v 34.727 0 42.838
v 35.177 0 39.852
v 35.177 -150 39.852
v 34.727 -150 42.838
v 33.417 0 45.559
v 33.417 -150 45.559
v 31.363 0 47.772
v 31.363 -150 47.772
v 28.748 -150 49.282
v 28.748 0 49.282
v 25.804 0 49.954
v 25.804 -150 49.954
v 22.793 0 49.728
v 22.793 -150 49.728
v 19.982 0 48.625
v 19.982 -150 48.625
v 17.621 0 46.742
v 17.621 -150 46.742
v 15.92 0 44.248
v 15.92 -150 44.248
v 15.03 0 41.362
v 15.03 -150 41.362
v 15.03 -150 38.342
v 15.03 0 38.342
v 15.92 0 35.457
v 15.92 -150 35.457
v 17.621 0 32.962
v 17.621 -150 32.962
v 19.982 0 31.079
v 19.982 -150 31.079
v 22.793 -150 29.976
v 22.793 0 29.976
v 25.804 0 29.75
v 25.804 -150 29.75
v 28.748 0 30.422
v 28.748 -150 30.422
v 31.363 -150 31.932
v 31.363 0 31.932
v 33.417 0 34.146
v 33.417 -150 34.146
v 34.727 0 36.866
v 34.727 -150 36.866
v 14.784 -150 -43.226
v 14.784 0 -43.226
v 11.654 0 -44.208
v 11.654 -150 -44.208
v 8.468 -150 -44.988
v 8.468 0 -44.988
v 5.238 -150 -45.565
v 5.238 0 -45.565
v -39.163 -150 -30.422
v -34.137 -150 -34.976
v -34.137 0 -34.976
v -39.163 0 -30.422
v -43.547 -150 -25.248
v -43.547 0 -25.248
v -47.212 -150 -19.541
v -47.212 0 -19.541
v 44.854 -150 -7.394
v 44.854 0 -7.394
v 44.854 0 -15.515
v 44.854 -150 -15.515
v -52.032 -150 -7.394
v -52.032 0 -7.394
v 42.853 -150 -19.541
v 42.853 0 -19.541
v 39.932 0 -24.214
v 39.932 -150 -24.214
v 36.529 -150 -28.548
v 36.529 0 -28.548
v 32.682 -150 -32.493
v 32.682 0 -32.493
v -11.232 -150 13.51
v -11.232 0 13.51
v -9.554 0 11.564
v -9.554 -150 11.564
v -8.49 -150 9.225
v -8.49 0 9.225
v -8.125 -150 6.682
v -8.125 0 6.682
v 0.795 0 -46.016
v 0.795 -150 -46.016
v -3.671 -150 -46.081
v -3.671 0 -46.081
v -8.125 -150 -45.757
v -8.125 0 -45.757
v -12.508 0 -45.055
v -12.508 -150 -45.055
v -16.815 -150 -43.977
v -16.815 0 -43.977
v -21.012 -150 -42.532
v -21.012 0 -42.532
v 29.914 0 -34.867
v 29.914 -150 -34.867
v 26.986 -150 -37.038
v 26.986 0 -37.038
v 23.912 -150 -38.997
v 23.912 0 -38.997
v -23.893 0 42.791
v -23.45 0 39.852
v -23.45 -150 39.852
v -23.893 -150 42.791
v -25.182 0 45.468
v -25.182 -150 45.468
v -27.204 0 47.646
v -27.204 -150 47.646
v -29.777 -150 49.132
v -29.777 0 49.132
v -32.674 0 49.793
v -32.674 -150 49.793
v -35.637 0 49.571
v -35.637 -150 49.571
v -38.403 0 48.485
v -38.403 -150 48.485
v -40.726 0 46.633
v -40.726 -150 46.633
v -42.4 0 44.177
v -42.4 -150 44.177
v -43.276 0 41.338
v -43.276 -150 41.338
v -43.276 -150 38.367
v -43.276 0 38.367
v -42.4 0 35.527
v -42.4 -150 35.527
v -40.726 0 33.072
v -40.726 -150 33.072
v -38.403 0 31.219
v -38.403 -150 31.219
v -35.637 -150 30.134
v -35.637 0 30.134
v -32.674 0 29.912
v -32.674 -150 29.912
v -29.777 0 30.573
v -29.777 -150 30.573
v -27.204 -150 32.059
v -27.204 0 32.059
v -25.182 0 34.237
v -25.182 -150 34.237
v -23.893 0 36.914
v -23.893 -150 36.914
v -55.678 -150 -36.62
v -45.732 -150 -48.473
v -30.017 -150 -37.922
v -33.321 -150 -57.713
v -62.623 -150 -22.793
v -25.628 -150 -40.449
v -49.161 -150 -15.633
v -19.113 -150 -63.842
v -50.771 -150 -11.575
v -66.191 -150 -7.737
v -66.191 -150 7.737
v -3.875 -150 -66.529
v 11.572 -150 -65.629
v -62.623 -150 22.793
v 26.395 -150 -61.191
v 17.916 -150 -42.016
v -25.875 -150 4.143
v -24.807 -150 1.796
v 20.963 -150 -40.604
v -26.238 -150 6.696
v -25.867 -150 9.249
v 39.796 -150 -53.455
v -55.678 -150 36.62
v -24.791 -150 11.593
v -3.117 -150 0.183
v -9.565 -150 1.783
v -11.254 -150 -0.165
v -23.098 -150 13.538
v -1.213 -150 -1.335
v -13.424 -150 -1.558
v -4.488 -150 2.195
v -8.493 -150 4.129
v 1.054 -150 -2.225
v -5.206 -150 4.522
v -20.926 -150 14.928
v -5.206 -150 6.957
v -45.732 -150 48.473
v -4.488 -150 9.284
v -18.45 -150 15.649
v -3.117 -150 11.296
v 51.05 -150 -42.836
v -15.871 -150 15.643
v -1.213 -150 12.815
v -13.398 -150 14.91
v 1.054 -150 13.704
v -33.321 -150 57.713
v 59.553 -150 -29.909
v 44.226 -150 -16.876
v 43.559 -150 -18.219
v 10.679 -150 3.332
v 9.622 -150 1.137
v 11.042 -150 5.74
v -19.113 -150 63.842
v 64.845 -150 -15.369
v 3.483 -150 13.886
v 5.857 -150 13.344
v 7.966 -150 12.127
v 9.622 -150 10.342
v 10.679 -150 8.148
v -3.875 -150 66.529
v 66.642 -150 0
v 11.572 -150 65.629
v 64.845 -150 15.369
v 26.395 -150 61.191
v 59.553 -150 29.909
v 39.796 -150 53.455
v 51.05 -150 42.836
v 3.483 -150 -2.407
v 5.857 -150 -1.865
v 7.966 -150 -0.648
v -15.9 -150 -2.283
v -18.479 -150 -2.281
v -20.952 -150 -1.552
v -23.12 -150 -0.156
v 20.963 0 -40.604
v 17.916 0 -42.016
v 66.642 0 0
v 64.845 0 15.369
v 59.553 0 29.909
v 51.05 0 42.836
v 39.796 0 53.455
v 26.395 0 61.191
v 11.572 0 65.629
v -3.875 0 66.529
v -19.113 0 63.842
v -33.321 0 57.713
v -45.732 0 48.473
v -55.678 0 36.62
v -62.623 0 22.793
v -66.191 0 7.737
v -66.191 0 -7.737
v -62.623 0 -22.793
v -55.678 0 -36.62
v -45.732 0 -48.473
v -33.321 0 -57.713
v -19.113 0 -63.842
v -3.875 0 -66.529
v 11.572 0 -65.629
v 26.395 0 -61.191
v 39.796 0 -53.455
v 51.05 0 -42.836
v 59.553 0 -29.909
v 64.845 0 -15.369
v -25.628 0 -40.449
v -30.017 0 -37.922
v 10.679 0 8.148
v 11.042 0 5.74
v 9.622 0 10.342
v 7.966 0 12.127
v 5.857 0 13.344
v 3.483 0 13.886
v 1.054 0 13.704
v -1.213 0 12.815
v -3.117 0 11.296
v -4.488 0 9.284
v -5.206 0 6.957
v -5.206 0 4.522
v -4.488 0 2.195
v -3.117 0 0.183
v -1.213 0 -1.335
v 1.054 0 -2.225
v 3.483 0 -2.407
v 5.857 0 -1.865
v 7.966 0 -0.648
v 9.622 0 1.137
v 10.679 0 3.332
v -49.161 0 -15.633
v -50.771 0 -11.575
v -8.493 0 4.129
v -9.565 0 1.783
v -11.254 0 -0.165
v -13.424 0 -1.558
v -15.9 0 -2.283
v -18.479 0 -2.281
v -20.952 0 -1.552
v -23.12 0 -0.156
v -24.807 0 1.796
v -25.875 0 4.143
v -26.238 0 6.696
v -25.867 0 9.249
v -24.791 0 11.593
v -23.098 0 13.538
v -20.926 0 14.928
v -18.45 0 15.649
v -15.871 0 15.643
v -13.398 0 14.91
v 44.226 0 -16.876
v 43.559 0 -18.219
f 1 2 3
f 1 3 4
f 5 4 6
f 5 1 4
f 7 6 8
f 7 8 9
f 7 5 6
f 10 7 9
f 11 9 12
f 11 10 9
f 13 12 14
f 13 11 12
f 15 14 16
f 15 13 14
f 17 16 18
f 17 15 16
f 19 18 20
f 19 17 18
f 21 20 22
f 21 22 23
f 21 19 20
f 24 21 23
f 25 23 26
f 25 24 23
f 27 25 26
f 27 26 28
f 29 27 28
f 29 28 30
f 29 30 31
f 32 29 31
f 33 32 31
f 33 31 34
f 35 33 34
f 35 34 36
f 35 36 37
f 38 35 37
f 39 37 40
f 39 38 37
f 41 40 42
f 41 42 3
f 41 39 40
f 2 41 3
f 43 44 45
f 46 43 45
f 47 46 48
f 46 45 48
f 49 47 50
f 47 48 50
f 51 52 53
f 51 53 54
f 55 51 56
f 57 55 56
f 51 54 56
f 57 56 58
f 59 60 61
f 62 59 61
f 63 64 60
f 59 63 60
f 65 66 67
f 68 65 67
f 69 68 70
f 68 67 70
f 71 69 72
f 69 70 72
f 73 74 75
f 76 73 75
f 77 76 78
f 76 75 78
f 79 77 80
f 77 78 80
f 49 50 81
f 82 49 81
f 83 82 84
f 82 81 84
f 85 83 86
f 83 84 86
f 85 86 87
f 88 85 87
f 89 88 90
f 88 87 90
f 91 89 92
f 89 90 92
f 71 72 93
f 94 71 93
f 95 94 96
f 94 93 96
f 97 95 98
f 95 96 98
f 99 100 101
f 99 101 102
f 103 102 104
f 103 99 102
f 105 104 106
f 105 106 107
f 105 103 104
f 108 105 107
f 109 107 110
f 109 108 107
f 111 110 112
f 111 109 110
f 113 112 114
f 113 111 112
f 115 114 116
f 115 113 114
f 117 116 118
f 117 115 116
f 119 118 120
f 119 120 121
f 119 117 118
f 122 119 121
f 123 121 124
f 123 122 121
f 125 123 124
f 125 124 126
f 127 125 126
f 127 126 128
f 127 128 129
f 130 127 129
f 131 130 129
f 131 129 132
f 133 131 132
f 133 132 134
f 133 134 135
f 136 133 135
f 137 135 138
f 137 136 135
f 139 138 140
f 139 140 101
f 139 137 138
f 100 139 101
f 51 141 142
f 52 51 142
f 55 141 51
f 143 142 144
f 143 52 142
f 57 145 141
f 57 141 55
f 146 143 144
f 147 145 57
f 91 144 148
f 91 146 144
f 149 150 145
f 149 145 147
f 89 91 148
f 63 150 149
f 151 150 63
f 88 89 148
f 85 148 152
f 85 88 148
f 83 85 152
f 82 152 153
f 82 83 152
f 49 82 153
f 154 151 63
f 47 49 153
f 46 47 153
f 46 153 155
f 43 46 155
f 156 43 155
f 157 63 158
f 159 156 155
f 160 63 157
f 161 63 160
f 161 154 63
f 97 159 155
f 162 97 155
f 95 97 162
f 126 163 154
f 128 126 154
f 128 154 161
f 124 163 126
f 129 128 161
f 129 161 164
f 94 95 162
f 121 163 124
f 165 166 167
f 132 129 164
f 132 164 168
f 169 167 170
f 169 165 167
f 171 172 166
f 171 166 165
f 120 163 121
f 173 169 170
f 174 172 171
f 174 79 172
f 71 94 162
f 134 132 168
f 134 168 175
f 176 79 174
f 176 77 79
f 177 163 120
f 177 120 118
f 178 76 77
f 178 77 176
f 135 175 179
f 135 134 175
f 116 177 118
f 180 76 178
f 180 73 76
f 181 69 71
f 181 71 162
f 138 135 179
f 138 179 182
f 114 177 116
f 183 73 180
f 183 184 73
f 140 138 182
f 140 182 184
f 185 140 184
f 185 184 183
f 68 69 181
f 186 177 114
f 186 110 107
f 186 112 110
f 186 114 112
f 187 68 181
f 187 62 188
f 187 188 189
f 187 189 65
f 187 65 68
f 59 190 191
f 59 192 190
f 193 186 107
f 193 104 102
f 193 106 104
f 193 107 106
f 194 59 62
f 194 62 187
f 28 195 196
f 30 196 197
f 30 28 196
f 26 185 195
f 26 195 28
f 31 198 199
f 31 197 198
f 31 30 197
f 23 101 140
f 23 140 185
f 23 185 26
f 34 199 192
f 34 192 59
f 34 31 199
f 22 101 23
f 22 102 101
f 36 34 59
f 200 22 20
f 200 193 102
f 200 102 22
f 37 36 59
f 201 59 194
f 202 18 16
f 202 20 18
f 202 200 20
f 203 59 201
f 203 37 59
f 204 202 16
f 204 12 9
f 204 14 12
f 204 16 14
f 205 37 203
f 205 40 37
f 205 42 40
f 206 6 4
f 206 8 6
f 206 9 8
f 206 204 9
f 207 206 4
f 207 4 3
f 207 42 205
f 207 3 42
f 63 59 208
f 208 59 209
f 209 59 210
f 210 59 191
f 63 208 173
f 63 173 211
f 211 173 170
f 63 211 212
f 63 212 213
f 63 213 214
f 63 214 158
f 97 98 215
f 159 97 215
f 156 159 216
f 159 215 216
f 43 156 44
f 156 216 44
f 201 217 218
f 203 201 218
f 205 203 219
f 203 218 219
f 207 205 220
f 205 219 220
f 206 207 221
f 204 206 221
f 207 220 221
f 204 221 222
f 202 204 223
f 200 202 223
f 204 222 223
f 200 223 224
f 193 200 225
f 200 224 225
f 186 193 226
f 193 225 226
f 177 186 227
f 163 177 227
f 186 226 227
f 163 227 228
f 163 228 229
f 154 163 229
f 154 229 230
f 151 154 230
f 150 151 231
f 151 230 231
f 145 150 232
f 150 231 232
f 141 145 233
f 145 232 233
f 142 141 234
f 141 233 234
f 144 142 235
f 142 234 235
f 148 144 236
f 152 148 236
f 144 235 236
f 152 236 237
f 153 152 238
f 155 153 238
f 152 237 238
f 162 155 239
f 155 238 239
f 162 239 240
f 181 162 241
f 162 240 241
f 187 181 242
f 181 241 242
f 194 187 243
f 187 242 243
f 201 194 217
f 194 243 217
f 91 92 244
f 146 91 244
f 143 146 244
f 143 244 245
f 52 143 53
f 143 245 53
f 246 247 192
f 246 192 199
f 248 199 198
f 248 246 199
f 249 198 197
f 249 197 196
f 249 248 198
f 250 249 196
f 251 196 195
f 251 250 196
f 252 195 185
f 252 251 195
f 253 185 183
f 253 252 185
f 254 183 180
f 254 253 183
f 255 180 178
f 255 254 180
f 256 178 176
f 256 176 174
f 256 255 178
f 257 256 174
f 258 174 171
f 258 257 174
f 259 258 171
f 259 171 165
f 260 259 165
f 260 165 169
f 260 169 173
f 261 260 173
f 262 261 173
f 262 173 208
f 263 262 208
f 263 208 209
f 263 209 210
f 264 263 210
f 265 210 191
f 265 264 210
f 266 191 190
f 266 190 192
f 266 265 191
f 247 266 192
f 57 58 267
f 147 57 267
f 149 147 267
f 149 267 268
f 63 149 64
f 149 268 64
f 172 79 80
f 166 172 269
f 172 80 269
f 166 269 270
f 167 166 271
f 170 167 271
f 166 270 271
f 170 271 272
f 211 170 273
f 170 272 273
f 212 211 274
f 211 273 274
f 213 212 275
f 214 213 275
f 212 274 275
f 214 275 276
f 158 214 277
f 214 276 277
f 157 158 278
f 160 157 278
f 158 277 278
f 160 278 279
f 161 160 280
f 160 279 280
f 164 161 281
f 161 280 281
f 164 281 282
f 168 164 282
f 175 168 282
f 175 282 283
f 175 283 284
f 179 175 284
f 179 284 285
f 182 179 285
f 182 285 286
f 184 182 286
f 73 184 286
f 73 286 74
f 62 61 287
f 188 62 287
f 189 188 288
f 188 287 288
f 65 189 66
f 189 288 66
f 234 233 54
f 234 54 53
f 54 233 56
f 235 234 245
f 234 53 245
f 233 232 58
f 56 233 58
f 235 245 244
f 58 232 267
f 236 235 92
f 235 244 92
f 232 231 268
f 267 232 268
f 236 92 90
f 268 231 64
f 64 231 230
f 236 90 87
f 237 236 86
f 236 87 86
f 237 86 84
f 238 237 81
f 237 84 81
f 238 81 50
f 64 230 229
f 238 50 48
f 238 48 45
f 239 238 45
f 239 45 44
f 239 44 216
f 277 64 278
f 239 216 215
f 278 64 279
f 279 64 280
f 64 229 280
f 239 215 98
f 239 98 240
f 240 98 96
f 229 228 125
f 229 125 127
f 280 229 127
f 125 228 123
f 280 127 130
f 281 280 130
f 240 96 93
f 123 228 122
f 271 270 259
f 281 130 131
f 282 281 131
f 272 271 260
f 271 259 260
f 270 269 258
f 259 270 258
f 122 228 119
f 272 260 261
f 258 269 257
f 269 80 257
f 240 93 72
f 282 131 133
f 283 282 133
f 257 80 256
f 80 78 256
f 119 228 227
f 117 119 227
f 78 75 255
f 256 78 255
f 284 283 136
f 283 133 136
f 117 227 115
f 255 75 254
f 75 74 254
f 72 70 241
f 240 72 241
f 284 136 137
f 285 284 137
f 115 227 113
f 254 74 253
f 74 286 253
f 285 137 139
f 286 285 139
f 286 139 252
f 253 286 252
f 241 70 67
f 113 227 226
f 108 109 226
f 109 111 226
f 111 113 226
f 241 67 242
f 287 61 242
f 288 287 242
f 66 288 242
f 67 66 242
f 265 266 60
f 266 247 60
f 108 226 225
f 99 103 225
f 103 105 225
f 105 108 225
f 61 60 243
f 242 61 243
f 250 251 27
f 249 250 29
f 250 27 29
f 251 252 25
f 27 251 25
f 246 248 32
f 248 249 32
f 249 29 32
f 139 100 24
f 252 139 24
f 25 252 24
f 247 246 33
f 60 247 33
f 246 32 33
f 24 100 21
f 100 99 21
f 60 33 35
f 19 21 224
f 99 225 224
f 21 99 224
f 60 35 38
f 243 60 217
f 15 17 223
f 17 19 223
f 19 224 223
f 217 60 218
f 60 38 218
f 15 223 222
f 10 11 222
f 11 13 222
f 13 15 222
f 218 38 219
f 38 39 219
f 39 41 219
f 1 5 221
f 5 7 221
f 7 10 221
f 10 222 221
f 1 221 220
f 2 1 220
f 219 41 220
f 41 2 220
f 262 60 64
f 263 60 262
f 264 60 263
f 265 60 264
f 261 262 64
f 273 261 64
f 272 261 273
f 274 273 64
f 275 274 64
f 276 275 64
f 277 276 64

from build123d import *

# Parameters (mm, degrees)
F0_R     = 66.641501
F0_R_2   = 9.968602
F0_R_3   = 8.169594
F0_R_4   = 10.130103
F1_DEPTH = 150


with BuildPart() as f1:
    # F0 (on Front) → F1 (new body)
    with BuildSketch(Plane.XZ):
        Circle(F0_R)
        with BuildLine():
            ThreePointArc((-47.21239, -19.541254), (-50.009162, -13.621133), (-52.03151, -7.393784))
            Line((-52.03151, -7.393784), (-34.136722, -7.393784))
            Line((-34.136722, -7.393784), (-21.011824, -7.393784))
            Line((-21.011824, -7.393784), (-8.125476, -7.393784))
            Line((-8.125476, -7.393784), (5.238163, -7.393784))
            Line((5.238163, -7.393784), (14.783629, -7.393784))
            Line((14.783629, -7.393784), (23.911529, -7.393784))
            Line((23.911529, -7.393784), (32.681515, -7.393784))
            Line((32.681515, -7.393784), (44.854218, -7.393784))
            Line((44.854218, -7.393784), (44.854218, -15.515085))
            ThreePointArc((44.854218, -15.515085), (43.897568, -17.550039), (42.852925, -19.541254))
            ThreePointArc((42.852925, -19.541254), (38.288746, -26.426826), (32.681515, -32.493274))
            ThreePointArc((32.681515, -32.493274), (28.469498, -35.978188), (23.911529, -38.996572))
            ThreePointArc((23.911529, -38.996572), (19.451177, -41.334676), (14.783629, -43.225568))
            ThreePointArc((14.783629, -43.225568), (10.066868, -44.623512), (5.238163, -45.564626))
            ThreePointArc((5.238163, -45.564626), (-1.43737, -46.096762), (-8.125476, -45.757446))
            ThreePointArc((-8.125476, -45.757446), (-14.673168, -44.56238), (-21.011824, -42.532135))
            ThreePointArc((-21.011824, -42.532135), (-27.853806, -39.239377), (-34.136722, -34.975583))
            ThreePointArc((-34.136722, -34.975583), (-41.440477, -27.907292), (-47.21239, -19.541254))
        make_face(mode=Mode.SUBTRACT)
        with BuildLine():
            ThreePointArc((-11.232171, 13.509632), (-8.938658, 10.432505), (-8.125476, 6.681819))
            ThreePointArc((-8.125476, 6.681819), (-25.42498, 2.931132), (-11.232171, 13.509632))
        make_face(mode=Mode.SUBTRACT)
        with Locations((-33.41883, 39.852273)):
            Circle(F0_R_2, mode=Mode.SUBTRACT)
        with Locations((2.872223, 5.739587)):
            Circle(F0_R_3, mode=Mode.SUBTRACT)
        with Locations((25.047079, 39.852273)):
            Circle(F0_R_4, mode=Mode.SUBTRACT)
    extrude(amount=F1_DEPTH)


solid = f1.part
